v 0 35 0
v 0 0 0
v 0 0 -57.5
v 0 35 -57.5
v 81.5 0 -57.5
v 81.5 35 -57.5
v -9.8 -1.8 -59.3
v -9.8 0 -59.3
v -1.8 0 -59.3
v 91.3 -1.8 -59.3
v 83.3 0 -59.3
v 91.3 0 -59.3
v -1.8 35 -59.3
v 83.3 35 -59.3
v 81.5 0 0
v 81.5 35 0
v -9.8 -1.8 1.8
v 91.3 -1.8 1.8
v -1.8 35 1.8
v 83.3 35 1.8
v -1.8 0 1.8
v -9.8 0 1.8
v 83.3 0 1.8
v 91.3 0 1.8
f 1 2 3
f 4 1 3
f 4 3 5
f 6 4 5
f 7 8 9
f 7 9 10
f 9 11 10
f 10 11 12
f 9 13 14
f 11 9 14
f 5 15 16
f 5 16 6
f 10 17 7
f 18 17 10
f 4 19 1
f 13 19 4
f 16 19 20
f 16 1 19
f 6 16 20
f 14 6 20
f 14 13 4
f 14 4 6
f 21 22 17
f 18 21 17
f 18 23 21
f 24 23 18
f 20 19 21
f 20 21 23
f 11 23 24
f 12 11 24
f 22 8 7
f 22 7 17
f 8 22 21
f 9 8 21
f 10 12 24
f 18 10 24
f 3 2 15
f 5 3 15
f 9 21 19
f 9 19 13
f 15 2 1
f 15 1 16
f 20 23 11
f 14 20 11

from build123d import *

# Parameters (mm, degrees)
SKICA1_W                = 85.1
SKICA1_H                = 61.1
SKICA1_W_2              = 81.5
SKICA1_H_2              = 57.5
P_IDAT_VYSUNUT_M1_DEPTH = 35
SKICA2_W                = 101.1
SKICA2_H                = 61.1
P_IDAT_VYSUNUT_M2_DEPTH = 1.8


with BuildPart() as part:
    # Skica1 → Přidat vysunutím1 (new body)
    with BuildSketch(Plane(origin=(0, 0, 0), x_dir=(1, 0, 0), z_dir=(0, 1, 0))):
        with Locations((40.75, 28.75)):
            Rectangle(SKICA1_W, SKICA1_H)
        with Locations((40.75, 28.75)):
            Rectangle(SKICA1_W_2, SKICA1_H_2, mode=Mode.SUBTRACT)
    extrude(amount=P_IDAT_VYSUNUT_M1_DEPTH)

    # Skica2 → Přidat vysunutím2 (add)
    with BuildSketch(Plane.XZ):
        with Locations((40.75, -28.75)):
            Rectangle(SKICA2_W, SKICA2_H)
    extrude(amount=P_IDAT_VYSUNUT_M2_DEPTH)


solid = part.part
